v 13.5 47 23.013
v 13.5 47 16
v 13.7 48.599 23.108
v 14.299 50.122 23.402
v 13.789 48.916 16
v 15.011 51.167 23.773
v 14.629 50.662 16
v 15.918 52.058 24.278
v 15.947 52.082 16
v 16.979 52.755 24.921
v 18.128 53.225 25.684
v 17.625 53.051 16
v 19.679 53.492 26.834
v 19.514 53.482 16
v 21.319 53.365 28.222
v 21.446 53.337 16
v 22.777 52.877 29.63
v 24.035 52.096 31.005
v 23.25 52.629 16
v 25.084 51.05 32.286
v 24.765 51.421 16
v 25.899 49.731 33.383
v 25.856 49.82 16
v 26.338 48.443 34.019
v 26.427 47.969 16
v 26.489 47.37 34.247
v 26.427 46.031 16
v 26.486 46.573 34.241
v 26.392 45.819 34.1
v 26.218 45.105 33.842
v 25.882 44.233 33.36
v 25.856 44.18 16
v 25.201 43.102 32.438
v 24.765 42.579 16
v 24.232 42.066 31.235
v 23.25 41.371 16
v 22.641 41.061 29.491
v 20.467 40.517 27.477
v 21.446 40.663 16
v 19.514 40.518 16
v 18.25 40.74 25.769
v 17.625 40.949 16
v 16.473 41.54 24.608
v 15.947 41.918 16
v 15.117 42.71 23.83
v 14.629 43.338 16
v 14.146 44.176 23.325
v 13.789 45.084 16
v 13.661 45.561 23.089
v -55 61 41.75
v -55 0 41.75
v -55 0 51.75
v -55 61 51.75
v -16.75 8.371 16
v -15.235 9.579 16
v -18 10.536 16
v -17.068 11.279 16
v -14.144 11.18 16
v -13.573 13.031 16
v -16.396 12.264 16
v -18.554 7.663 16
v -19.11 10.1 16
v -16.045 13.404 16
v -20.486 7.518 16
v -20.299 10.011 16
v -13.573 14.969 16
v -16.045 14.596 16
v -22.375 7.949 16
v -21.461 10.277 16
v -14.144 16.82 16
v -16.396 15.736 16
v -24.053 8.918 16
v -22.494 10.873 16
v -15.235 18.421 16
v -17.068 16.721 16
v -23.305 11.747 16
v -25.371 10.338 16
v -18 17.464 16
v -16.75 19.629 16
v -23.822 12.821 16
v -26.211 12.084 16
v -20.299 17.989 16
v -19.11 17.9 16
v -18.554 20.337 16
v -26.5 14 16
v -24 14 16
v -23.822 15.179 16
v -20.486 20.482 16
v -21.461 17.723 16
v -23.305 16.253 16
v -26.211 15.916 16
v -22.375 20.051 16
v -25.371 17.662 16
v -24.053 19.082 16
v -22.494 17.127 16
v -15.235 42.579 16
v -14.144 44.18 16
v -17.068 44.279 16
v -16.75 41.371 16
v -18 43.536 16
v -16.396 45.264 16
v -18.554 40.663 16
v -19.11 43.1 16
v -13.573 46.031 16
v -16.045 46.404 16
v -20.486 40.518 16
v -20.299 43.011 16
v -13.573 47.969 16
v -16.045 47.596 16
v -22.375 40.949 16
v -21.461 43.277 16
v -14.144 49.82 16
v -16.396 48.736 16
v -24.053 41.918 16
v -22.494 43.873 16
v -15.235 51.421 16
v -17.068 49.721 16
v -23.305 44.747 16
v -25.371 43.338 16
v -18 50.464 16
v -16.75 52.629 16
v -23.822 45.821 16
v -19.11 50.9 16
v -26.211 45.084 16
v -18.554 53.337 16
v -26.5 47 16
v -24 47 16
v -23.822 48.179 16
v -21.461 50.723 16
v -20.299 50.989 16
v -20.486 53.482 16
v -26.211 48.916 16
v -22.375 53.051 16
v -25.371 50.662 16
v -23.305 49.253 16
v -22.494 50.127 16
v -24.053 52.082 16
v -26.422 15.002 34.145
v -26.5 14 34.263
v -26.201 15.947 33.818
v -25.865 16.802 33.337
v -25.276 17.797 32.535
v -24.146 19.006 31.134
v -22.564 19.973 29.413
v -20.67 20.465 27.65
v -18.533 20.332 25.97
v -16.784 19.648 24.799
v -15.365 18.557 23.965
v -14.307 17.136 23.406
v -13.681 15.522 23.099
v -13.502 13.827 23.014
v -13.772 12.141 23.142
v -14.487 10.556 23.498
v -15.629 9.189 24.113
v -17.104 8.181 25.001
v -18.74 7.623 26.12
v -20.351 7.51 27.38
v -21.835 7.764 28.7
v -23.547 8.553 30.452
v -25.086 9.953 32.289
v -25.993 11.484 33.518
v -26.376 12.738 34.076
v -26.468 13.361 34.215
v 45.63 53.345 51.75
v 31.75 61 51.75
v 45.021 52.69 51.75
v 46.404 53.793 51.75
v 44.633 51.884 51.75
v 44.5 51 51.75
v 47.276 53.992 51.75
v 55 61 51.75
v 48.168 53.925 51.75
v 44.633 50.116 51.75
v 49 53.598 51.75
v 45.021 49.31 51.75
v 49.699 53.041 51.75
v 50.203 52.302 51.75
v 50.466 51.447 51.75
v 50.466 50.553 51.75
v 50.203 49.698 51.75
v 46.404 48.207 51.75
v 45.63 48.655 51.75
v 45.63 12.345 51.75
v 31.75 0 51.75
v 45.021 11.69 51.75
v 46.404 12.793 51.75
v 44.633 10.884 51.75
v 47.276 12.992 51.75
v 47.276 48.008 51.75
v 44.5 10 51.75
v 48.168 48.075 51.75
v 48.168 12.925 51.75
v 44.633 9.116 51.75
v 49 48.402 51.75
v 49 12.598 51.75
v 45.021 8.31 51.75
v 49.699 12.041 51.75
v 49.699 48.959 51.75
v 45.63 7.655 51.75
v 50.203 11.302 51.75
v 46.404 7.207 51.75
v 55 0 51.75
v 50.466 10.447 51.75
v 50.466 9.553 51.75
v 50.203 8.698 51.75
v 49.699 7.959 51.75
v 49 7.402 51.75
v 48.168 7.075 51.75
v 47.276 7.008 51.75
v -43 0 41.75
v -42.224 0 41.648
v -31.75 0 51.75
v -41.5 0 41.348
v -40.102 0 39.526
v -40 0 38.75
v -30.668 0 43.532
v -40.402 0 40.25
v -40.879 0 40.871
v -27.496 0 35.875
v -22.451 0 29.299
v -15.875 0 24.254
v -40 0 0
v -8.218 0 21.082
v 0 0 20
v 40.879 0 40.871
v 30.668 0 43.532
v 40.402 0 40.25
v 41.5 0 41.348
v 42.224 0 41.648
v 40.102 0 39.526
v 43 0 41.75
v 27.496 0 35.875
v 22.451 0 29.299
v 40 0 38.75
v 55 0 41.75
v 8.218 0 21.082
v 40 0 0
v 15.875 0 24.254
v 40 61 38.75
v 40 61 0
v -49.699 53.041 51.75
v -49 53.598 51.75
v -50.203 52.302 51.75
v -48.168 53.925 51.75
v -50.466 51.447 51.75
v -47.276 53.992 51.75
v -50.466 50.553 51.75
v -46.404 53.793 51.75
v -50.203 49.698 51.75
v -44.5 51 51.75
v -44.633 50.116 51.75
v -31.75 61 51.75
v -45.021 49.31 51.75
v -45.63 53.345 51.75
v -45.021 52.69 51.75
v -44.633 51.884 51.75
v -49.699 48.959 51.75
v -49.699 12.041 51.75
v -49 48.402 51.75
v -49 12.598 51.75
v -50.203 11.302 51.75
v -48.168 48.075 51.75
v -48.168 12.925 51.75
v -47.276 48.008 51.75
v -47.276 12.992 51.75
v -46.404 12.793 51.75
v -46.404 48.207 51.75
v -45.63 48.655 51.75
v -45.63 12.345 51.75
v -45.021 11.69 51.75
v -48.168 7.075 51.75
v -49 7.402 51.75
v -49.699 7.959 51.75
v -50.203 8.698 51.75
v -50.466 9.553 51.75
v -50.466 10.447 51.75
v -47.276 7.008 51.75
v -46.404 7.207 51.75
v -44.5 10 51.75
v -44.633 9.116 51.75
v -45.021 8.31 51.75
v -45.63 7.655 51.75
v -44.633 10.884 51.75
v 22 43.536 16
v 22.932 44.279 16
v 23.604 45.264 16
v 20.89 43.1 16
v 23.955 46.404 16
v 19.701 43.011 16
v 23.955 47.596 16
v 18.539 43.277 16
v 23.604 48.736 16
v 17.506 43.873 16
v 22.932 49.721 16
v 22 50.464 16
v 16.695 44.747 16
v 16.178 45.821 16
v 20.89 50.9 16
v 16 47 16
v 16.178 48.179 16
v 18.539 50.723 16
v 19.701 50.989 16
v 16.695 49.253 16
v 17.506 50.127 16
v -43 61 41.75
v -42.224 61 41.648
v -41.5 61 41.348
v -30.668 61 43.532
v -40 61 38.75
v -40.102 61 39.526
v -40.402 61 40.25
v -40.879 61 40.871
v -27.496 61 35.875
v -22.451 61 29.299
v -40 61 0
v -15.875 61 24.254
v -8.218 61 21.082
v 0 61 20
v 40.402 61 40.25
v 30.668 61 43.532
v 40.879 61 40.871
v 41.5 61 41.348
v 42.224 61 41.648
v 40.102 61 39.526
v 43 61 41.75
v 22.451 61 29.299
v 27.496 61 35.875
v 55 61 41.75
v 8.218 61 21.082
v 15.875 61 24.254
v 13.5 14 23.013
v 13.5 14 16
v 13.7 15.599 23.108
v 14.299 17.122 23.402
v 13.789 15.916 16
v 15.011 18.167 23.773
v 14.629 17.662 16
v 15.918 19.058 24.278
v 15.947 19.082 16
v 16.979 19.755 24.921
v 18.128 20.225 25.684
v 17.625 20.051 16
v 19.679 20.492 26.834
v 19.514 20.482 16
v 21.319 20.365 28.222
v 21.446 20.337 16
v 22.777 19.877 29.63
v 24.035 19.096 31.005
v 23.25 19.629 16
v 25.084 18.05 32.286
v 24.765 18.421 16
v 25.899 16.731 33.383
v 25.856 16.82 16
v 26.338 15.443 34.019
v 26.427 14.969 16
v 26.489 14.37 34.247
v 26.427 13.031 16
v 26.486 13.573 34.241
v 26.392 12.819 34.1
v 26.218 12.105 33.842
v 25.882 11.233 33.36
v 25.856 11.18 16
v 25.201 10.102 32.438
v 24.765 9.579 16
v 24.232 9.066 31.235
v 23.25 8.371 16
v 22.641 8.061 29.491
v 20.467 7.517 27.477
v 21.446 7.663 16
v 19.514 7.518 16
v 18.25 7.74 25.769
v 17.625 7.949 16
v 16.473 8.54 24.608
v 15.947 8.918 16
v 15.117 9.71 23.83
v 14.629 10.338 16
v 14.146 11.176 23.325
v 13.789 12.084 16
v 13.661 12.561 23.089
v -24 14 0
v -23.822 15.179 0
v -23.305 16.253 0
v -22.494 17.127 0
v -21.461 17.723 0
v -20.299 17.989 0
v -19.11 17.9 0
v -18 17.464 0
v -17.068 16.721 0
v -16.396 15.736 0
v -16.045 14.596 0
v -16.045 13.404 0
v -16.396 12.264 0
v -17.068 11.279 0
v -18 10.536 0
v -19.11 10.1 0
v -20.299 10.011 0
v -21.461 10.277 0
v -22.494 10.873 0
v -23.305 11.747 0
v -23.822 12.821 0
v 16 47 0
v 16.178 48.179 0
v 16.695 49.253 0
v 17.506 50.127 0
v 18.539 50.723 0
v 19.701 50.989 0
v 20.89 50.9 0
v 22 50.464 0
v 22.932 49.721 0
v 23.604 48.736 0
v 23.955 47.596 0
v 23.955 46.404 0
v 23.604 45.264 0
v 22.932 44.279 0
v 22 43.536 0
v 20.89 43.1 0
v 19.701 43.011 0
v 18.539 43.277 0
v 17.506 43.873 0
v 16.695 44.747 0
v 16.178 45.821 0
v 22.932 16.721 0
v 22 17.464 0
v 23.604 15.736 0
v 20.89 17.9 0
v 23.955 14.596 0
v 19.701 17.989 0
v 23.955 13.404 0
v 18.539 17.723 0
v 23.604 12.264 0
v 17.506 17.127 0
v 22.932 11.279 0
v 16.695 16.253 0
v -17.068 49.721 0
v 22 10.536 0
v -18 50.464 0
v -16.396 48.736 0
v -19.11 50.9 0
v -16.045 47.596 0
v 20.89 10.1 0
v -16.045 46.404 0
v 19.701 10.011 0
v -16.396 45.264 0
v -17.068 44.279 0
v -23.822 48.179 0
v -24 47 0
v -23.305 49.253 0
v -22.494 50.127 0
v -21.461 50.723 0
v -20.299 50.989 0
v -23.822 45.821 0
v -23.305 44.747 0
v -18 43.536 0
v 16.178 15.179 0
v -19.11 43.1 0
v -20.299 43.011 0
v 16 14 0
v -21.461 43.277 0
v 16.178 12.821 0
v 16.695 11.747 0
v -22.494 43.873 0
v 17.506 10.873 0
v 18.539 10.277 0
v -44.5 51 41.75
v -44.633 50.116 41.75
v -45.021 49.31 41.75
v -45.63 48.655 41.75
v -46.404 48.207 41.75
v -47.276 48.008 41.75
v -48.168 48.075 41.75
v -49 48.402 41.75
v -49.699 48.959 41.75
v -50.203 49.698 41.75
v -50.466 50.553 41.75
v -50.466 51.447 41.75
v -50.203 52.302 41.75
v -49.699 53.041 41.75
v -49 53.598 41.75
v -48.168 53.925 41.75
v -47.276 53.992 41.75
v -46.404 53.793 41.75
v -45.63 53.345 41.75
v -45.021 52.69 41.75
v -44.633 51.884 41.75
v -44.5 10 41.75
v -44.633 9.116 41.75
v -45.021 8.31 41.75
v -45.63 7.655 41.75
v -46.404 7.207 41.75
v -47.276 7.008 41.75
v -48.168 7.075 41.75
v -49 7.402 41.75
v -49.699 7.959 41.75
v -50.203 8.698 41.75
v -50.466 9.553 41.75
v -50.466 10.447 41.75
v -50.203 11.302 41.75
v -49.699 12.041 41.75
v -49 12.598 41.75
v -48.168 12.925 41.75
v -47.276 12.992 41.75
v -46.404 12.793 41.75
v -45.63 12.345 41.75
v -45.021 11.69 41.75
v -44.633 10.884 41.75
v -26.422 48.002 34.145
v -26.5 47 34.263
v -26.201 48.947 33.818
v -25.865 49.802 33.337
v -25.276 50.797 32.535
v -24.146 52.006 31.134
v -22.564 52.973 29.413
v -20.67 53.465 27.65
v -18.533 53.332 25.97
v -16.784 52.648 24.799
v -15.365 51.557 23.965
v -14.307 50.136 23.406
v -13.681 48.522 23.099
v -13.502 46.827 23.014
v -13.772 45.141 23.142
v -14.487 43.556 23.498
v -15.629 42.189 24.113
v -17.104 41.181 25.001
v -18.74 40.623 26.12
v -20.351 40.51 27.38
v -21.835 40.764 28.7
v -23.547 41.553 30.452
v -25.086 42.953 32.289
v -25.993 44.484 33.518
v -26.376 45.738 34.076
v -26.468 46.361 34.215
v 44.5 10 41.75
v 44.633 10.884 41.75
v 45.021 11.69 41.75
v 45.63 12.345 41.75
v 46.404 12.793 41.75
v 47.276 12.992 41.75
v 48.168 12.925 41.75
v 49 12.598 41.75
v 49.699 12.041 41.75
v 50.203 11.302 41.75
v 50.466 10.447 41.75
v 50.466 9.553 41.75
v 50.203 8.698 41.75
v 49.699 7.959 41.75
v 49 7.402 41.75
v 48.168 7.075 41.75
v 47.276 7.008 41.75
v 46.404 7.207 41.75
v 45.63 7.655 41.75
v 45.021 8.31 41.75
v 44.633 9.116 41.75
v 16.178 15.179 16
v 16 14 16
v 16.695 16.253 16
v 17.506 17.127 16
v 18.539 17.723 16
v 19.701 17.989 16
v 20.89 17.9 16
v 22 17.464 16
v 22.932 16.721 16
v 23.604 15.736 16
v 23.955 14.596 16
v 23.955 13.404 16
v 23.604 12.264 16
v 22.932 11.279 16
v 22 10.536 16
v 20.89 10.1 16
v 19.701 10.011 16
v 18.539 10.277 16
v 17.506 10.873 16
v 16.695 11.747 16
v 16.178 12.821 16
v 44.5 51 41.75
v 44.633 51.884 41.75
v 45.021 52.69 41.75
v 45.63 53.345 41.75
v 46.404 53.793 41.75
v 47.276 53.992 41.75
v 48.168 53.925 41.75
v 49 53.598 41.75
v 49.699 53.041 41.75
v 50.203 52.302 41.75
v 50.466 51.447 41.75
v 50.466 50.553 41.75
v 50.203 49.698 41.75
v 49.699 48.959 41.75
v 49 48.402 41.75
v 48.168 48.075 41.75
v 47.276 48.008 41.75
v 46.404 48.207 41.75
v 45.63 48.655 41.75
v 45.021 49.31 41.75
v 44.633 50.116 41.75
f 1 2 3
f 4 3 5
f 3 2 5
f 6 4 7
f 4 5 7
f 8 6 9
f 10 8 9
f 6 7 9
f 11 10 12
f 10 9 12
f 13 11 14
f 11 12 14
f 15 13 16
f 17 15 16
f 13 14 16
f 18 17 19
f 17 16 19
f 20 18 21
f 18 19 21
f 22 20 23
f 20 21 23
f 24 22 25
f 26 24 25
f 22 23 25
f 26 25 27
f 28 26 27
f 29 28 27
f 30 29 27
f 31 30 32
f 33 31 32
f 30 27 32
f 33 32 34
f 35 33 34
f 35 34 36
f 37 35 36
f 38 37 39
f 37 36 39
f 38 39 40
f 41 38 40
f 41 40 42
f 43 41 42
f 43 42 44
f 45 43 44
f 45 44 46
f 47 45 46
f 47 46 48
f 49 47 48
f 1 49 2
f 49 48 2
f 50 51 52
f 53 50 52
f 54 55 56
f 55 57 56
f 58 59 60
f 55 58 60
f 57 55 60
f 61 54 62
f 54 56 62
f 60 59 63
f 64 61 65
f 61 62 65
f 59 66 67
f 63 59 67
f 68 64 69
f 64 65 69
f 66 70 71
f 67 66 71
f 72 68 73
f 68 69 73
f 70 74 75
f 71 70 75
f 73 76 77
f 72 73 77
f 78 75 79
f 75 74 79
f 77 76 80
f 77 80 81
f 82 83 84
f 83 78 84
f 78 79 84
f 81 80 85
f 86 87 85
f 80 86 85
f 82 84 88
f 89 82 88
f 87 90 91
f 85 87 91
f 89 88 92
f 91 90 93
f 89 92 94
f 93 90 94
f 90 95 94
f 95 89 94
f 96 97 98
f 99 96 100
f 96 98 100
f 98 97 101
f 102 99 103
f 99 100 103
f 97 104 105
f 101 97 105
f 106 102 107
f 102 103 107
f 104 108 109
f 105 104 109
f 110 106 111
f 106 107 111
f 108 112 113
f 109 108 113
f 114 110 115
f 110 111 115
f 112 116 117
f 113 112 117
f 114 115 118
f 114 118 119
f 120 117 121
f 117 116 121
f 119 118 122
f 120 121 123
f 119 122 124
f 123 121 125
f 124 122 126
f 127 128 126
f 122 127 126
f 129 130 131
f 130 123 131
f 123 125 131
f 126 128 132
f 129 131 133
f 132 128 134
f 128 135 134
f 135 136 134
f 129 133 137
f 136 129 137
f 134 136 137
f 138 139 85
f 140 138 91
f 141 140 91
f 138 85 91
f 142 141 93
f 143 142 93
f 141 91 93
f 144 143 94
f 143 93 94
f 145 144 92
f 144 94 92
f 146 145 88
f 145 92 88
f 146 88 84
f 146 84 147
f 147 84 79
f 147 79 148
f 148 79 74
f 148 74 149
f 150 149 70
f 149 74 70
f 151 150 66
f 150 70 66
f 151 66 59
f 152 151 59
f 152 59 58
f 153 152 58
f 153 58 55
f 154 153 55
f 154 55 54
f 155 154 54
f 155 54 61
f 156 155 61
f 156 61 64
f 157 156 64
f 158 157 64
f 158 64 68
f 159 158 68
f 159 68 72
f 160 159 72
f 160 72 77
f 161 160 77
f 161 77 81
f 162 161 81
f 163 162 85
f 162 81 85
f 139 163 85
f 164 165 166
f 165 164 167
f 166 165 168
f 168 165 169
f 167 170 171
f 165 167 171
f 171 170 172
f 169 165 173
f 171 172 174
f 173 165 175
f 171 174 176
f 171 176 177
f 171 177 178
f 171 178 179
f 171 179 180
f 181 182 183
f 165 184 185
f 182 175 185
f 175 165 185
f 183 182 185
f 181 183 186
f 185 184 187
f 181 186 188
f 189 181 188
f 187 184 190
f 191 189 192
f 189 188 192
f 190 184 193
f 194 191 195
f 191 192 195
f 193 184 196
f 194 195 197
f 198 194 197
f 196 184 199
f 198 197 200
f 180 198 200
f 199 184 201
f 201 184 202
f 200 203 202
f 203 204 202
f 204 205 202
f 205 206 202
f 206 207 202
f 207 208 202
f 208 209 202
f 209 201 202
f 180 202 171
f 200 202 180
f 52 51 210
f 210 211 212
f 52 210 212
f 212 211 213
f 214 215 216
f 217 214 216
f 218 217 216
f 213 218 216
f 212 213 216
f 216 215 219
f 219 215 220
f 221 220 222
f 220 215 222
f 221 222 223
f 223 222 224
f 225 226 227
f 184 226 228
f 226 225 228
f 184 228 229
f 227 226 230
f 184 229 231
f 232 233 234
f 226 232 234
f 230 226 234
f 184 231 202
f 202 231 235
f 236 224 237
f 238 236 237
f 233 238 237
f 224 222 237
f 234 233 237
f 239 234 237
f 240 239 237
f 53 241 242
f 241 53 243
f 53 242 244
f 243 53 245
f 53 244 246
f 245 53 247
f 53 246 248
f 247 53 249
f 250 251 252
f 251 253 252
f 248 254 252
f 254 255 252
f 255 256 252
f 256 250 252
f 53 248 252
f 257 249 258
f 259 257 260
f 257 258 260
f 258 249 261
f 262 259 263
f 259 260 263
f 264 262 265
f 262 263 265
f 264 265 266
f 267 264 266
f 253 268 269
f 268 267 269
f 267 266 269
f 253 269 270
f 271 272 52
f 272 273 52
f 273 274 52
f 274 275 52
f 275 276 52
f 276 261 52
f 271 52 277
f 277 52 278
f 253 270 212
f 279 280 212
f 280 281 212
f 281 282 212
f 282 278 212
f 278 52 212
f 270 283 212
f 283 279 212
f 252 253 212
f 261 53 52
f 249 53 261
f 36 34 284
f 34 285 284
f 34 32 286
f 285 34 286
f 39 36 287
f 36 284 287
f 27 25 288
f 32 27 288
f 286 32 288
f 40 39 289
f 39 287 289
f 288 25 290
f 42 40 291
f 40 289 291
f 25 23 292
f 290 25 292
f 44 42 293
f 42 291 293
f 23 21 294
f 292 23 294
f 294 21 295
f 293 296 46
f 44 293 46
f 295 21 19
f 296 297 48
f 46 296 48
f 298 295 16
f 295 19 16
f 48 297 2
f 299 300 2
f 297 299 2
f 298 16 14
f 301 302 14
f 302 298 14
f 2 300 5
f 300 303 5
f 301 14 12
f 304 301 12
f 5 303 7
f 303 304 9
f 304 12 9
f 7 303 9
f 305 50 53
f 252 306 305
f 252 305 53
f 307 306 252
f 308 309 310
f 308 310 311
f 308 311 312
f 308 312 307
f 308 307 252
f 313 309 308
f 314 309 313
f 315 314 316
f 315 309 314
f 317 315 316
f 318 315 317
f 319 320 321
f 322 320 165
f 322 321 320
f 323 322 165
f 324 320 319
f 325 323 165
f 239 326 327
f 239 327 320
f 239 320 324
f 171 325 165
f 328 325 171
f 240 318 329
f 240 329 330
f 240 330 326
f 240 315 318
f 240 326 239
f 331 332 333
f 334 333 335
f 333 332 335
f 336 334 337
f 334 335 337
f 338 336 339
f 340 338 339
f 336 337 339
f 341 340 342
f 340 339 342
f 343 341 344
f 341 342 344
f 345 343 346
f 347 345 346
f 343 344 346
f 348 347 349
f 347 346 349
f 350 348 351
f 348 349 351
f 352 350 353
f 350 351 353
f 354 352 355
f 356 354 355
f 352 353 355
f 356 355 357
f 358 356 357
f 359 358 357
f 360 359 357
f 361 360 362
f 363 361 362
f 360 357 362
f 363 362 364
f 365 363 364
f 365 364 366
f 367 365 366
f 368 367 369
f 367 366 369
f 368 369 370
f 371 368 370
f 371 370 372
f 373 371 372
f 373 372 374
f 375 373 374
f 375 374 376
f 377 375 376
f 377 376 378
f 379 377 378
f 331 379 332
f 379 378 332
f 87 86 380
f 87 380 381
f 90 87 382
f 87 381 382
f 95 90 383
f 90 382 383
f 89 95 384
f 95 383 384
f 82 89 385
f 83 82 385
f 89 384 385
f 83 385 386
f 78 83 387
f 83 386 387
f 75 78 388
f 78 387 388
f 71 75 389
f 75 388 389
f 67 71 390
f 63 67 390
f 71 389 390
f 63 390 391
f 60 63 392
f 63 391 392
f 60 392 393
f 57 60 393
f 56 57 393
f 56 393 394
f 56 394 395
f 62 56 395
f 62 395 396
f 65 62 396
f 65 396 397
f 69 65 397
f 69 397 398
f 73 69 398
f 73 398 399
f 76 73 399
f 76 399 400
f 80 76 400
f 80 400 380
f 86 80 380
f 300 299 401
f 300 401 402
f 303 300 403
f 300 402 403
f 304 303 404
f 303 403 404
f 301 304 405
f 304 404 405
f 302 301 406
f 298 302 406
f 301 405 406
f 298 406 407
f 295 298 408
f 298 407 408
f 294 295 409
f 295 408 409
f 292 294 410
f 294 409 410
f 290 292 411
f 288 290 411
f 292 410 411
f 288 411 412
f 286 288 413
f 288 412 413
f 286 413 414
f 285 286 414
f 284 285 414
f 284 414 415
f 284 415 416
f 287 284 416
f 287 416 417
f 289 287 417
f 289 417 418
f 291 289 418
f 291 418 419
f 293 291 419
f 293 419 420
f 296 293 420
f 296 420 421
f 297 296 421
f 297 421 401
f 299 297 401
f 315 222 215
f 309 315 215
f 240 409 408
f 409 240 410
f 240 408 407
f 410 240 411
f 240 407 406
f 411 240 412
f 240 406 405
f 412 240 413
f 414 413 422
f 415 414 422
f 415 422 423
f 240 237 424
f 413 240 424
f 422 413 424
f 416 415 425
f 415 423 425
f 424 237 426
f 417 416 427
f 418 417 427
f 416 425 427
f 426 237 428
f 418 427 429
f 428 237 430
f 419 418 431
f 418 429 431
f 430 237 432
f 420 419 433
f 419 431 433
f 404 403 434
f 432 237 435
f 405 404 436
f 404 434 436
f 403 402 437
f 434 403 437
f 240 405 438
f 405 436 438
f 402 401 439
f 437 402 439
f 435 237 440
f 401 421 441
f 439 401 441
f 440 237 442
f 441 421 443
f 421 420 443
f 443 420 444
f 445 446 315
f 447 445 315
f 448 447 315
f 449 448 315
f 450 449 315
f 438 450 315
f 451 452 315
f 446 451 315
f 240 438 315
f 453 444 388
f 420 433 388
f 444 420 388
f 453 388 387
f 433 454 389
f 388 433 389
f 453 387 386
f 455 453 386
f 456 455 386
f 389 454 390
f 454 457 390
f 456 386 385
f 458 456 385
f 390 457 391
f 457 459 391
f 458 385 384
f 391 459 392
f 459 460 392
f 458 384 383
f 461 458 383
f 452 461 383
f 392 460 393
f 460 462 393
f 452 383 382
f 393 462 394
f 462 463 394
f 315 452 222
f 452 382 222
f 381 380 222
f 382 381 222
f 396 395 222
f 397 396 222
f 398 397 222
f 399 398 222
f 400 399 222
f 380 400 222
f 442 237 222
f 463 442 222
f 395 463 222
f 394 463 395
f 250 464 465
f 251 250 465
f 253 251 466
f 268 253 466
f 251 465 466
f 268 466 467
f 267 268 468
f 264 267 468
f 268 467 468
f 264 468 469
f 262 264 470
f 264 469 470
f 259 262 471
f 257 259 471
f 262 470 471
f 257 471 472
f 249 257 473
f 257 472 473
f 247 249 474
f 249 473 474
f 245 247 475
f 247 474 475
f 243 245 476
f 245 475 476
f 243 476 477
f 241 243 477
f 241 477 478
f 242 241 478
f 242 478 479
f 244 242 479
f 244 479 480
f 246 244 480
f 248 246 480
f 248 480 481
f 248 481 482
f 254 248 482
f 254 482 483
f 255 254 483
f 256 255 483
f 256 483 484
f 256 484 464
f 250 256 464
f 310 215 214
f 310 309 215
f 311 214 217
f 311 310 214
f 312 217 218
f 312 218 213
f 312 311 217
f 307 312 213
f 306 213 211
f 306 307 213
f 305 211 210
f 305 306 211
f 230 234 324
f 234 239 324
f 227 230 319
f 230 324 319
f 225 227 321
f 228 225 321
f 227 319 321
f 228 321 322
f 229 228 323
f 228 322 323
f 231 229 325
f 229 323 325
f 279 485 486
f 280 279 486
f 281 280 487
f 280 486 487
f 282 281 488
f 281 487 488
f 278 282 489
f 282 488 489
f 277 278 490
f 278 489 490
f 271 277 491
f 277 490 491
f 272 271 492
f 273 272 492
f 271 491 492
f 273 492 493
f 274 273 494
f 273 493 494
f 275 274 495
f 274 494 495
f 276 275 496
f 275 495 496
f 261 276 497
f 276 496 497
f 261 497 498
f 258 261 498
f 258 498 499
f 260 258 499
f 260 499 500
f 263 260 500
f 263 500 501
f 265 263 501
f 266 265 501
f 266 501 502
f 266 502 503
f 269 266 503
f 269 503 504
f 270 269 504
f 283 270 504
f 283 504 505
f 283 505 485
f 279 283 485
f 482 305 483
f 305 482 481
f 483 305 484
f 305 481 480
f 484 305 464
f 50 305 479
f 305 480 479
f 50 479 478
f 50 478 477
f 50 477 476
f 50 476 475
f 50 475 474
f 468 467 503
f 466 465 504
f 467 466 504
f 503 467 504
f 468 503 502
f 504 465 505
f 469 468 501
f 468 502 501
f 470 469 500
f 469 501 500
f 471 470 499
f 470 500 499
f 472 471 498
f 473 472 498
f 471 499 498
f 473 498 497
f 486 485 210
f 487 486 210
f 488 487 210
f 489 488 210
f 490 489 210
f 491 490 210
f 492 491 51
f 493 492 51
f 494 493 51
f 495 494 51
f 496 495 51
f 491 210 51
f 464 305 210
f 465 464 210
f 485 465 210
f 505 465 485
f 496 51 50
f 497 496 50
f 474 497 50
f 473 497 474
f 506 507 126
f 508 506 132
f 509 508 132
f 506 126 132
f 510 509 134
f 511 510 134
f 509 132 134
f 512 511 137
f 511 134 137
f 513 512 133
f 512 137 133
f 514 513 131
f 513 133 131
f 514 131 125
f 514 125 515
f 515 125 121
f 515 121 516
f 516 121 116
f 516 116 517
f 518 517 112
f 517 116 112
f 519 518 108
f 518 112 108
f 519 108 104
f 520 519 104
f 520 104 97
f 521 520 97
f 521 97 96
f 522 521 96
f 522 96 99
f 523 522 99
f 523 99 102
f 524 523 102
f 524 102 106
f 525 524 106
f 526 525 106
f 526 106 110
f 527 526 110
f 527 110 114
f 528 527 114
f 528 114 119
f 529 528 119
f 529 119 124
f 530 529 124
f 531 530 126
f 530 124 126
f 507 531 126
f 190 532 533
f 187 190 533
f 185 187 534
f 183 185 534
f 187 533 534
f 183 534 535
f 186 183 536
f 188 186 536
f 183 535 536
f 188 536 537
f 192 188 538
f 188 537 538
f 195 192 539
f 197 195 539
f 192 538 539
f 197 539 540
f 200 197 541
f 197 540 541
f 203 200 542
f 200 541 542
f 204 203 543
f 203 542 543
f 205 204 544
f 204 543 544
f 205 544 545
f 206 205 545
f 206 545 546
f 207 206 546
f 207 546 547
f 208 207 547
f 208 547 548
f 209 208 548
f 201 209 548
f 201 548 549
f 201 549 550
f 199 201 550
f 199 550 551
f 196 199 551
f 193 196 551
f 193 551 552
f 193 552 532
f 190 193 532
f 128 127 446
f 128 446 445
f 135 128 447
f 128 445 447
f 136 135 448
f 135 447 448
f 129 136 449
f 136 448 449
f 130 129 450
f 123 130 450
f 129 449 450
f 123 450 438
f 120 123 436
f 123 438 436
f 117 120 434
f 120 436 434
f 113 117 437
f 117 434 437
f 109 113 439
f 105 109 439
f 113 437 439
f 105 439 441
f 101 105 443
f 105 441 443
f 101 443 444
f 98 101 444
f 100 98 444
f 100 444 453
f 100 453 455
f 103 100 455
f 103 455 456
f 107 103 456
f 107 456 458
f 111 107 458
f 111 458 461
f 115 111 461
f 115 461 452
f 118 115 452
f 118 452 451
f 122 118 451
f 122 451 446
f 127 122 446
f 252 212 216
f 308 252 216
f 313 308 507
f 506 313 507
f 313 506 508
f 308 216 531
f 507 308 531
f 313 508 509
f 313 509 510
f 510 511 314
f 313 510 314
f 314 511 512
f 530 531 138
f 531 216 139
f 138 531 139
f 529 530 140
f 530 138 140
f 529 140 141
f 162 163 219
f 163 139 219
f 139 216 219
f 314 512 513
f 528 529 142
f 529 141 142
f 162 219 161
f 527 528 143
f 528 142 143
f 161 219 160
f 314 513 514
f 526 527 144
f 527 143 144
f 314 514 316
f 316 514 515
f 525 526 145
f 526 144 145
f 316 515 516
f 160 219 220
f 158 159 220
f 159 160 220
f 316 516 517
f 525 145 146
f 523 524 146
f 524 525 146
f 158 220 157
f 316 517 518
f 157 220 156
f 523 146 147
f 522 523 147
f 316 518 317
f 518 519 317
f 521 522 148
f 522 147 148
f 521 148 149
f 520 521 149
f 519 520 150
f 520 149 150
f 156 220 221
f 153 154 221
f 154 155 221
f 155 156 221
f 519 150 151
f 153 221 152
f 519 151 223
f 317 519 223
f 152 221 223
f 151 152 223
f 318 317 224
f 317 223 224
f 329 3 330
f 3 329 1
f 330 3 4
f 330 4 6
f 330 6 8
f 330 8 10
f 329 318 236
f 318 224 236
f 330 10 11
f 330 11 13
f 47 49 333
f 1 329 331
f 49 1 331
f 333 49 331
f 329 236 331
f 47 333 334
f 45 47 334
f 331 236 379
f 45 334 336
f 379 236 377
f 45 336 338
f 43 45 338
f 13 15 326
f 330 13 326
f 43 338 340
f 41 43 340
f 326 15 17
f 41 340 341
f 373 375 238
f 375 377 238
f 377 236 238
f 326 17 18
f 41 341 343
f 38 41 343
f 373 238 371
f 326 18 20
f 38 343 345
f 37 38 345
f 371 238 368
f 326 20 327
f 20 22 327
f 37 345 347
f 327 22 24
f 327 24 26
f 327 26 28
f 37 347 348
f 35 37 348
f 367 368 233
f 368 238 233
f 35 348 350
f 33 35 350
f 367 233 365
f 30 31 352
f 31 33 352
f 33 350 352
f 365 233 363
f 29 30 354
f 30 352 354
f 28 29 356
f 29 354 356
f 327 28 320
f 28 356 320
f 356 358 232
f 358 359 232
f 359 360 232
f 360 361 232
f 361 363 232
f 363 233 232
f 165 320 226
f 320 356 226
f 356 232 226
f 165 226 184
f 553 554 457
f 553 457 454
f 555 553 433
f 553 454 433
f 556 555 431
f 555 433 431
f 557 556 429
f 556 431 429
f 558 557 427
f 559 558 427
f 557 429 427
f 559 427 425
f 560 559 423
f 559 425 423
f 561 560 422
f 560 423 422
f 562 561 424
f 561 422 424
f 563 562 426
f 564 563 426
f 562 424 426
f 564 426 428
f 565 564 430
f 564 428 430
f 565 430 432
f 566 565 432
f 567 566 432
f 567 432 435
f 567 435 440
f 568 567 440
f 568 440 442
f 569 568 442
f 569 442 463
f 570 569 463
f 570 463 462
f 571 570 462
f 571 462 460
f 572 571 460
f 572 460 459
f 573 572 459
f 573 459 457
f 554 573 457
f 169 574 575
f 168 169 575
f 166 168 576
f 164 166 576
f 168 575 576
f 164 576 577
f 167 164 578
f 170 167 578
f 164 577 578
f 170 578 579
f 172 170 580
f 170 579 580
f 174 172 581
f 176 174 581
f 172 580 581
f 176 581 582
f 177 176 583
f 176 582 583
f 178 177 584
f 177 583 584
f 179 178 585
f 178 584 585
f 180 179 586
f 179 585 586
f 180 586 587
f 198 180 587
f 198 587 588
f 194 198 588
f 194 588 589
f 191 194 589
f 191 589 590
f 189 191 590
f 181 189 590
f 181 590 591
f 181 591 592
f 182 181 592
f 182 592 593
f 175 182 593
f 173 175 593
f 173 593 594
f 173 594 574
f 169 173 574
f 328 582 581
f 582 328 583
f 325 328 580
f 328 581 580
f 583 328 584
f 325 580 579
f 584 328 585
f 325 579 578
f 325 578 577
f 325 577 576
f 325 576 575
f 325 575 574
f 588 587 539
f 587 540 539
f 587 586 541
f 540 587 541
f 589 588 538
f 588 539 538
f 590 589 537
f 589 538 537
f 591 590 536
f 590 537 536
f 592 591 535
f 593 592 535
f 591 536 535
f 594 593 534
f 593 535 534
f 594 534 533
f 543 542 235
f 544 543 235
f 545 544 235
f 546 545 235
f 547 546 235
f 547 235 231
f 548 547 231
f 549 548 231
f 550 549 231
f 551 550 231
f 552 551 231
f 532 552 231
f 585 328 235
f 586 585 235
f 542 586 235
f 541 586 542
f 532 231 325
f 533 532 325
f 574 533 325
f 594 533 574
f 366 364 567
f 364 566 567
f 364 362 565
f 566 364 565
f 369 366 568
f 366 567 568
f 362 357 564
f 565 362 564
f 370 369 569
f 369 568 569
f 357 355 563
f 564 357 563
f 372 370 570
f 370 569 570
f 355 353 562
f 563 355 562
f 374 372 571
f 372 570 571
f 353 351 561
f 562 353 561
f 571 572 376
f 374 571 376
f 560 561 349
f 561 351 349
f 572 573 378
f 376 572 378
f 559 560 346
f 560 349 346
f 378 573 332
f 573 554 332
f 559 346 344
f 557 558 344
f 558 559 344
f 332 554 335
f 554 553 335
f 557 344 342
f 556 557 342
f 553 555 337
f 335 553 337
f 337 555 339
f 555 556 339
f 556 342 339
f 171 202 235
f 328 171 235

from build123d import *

# Parameters (mm, degrees)
BOSS_EXTRUDE1_DEPTH = 61
SKETCH2_R           = 3
CUT_EXTRUDE1_DEPTH  = 93.136108557
SKETCH3_R           = 4
CUT_EXTRUDE2_DEPTH  = 98.077610704
CUT_EXTRUDE3_START  = -16
SKETCH3_4_R         = 6.5
SKETCH3_4_R_2       = 4
CUT_EXTRUDE3_DEPTH  = 61
FILLET1_R           = 3


with BuildPart() as part:
    # Sketch1 → Boss-Extrude1 (new body)
    with BuildSketch(Plane(origin=(0, 0, 0), x_dir=(1, 0, 0), z_dir=(0, 1, 0))):
        with BuildLine():
            Line((40, 0), (0, 0))
            Line((0, 0), (-40, 0))
            Line((-40, 0), (-40, -20))
            Line((-40, -20), (-40, -41.75))
            Line((-40, -41.75), (-55, -41.75))
            Line((-55, -41.75), (-55, -51.75))
            Line((-55, -51.75), (-40, -51.75))
            Line((-40, -51.75), (-31.75, -51.75))
            ThreePointArc((-31.75, -51.75), (0, -20), (31.75, -51.75))
            Line((31.75, -51.75), (40, -51.75))
            Line((40, -51.75), (55, -51.75))
            Line((55, -51.75), (55, -41.75))
            Line((55, -41.75), (40, -41.75))
            Line((40, -41.75), (40, -20))
            Line((40, -20), (40, 0))
        make_face()
    extrude(amount=BOSS_EXTRUDE1_DEPTH)

    # Sketch2 → Cut-Extrude1 (cut, through all)
    with BuildSketch(Plane(origin=(0, 0, 41.75), x_dir=(-1, 0, 0), z_dir=(0, 0, -1))):
        with Locations((-47.5, 51)):
            Circle(SKETCH2_R)
        with Locations((-47.5, 10)):
            Circle(SKETCH2_R)
        with Locations((47.5, 10)):
            Circle(SKETCH2_R)
        with Locations((47.5, 51)):
            Circle(SKETCH2_R)
    extrude(amount=-CUT_EXTRUDE1_DEPTH, mode=Mode.SUBTRACT)

    # Sketch3 → Cut-Extrude2 (cut, through all)
    with BuildSketch(Plane(origin=(0, 0, 0), x_dir=(-1, 0, 0), z_dir=(0, 0, -1))):
        with Locations((-20, 47)):
            Circle(SKETCH3_R)
        with Locations((-20, 14)):
            Circle(SKETCH3_R)
        with Locations((20, 14)):
            Circle(SKETCH3_R)
        with Locations((20, 47)):
            Circle(SKETCH3_R)
    extrude(amount=-CUT_EXTRUDE2_DEPTH, mode=Mode.SUBTRACT)

    # Sketch3<4> → Cut-Extrude3 (cut)
    # profile 1 of 4: a face of its own
    with BuildSketch(Plane(origin=(0, 0, 0), x_dir=(-1, 0, 0), z_dir=(0, 0, -1)).offset(CUT_EXTRUDE3_START)):
        with Locations((-20, 47)):
            Circle(SKETCH3_4_R)
        with Locations((-20, 47)):
            Circle(SKETCH3_4_R_2, mode=Mode.SUBTRACT)
    # profile 2 of 4: a face of its own
    with BuildSketch(Plane(origin=(0, 0, 0), x_dir=(-1, 0, 0), z_dir=(0, 0, -1)).offset(CUT_EXTRUDE3_START)):
        with Locations((-20, 14)):
            Circle(SKETCH3_4_R)
        with Locations((-20, 14)):
            Circle(SKETCH3_4_R_2, mode=Mode.SUBTRACT)
    # profile 3 of 4: a face of its own
    with BuildSketch(Plane(origin=(0, 0, 0), x_dir=(-1, 0, 0), z_dir=(0, 0, -1)).offset(CUT_EXTRUDE3_START)):
        with Locations((20, 14)):
            Circle(SKETCH3_4_R)
        with Locations((20, 14)):
            Circle(SKETCH3_4_R_2, mode=Mode.SUBTRACT)
    # profile 4 of 4: a face of its own
    with BuildSketch(Plane(origin=(0, 0, 0), x_dir=(-1, 0, 0), z_dir=(0, 0, -1)).offset(CUT_EXTRUDE3_START)):
        with Locations((20, 47)):
            Circle(SKETCH3_4_R)
        with Locations((20, 47)):
            Circle(SKETCH3_4_R_2, mode=Mode.SUBTRACT)
    extrude(amount=-CUT_EXTRUDE3_DEPTH, mode=Mode.SUBTRACT)

    # Fillet1
    fillet1_edges = [part.edges().sort_by_distance(p)[0] for p in [
        (40, 30.5, 41.75),
        (-40, 30.5, 41.75),
    ]]
    fillet(fillet1_edges, radius=FILLET1_R)


solid = part.part
